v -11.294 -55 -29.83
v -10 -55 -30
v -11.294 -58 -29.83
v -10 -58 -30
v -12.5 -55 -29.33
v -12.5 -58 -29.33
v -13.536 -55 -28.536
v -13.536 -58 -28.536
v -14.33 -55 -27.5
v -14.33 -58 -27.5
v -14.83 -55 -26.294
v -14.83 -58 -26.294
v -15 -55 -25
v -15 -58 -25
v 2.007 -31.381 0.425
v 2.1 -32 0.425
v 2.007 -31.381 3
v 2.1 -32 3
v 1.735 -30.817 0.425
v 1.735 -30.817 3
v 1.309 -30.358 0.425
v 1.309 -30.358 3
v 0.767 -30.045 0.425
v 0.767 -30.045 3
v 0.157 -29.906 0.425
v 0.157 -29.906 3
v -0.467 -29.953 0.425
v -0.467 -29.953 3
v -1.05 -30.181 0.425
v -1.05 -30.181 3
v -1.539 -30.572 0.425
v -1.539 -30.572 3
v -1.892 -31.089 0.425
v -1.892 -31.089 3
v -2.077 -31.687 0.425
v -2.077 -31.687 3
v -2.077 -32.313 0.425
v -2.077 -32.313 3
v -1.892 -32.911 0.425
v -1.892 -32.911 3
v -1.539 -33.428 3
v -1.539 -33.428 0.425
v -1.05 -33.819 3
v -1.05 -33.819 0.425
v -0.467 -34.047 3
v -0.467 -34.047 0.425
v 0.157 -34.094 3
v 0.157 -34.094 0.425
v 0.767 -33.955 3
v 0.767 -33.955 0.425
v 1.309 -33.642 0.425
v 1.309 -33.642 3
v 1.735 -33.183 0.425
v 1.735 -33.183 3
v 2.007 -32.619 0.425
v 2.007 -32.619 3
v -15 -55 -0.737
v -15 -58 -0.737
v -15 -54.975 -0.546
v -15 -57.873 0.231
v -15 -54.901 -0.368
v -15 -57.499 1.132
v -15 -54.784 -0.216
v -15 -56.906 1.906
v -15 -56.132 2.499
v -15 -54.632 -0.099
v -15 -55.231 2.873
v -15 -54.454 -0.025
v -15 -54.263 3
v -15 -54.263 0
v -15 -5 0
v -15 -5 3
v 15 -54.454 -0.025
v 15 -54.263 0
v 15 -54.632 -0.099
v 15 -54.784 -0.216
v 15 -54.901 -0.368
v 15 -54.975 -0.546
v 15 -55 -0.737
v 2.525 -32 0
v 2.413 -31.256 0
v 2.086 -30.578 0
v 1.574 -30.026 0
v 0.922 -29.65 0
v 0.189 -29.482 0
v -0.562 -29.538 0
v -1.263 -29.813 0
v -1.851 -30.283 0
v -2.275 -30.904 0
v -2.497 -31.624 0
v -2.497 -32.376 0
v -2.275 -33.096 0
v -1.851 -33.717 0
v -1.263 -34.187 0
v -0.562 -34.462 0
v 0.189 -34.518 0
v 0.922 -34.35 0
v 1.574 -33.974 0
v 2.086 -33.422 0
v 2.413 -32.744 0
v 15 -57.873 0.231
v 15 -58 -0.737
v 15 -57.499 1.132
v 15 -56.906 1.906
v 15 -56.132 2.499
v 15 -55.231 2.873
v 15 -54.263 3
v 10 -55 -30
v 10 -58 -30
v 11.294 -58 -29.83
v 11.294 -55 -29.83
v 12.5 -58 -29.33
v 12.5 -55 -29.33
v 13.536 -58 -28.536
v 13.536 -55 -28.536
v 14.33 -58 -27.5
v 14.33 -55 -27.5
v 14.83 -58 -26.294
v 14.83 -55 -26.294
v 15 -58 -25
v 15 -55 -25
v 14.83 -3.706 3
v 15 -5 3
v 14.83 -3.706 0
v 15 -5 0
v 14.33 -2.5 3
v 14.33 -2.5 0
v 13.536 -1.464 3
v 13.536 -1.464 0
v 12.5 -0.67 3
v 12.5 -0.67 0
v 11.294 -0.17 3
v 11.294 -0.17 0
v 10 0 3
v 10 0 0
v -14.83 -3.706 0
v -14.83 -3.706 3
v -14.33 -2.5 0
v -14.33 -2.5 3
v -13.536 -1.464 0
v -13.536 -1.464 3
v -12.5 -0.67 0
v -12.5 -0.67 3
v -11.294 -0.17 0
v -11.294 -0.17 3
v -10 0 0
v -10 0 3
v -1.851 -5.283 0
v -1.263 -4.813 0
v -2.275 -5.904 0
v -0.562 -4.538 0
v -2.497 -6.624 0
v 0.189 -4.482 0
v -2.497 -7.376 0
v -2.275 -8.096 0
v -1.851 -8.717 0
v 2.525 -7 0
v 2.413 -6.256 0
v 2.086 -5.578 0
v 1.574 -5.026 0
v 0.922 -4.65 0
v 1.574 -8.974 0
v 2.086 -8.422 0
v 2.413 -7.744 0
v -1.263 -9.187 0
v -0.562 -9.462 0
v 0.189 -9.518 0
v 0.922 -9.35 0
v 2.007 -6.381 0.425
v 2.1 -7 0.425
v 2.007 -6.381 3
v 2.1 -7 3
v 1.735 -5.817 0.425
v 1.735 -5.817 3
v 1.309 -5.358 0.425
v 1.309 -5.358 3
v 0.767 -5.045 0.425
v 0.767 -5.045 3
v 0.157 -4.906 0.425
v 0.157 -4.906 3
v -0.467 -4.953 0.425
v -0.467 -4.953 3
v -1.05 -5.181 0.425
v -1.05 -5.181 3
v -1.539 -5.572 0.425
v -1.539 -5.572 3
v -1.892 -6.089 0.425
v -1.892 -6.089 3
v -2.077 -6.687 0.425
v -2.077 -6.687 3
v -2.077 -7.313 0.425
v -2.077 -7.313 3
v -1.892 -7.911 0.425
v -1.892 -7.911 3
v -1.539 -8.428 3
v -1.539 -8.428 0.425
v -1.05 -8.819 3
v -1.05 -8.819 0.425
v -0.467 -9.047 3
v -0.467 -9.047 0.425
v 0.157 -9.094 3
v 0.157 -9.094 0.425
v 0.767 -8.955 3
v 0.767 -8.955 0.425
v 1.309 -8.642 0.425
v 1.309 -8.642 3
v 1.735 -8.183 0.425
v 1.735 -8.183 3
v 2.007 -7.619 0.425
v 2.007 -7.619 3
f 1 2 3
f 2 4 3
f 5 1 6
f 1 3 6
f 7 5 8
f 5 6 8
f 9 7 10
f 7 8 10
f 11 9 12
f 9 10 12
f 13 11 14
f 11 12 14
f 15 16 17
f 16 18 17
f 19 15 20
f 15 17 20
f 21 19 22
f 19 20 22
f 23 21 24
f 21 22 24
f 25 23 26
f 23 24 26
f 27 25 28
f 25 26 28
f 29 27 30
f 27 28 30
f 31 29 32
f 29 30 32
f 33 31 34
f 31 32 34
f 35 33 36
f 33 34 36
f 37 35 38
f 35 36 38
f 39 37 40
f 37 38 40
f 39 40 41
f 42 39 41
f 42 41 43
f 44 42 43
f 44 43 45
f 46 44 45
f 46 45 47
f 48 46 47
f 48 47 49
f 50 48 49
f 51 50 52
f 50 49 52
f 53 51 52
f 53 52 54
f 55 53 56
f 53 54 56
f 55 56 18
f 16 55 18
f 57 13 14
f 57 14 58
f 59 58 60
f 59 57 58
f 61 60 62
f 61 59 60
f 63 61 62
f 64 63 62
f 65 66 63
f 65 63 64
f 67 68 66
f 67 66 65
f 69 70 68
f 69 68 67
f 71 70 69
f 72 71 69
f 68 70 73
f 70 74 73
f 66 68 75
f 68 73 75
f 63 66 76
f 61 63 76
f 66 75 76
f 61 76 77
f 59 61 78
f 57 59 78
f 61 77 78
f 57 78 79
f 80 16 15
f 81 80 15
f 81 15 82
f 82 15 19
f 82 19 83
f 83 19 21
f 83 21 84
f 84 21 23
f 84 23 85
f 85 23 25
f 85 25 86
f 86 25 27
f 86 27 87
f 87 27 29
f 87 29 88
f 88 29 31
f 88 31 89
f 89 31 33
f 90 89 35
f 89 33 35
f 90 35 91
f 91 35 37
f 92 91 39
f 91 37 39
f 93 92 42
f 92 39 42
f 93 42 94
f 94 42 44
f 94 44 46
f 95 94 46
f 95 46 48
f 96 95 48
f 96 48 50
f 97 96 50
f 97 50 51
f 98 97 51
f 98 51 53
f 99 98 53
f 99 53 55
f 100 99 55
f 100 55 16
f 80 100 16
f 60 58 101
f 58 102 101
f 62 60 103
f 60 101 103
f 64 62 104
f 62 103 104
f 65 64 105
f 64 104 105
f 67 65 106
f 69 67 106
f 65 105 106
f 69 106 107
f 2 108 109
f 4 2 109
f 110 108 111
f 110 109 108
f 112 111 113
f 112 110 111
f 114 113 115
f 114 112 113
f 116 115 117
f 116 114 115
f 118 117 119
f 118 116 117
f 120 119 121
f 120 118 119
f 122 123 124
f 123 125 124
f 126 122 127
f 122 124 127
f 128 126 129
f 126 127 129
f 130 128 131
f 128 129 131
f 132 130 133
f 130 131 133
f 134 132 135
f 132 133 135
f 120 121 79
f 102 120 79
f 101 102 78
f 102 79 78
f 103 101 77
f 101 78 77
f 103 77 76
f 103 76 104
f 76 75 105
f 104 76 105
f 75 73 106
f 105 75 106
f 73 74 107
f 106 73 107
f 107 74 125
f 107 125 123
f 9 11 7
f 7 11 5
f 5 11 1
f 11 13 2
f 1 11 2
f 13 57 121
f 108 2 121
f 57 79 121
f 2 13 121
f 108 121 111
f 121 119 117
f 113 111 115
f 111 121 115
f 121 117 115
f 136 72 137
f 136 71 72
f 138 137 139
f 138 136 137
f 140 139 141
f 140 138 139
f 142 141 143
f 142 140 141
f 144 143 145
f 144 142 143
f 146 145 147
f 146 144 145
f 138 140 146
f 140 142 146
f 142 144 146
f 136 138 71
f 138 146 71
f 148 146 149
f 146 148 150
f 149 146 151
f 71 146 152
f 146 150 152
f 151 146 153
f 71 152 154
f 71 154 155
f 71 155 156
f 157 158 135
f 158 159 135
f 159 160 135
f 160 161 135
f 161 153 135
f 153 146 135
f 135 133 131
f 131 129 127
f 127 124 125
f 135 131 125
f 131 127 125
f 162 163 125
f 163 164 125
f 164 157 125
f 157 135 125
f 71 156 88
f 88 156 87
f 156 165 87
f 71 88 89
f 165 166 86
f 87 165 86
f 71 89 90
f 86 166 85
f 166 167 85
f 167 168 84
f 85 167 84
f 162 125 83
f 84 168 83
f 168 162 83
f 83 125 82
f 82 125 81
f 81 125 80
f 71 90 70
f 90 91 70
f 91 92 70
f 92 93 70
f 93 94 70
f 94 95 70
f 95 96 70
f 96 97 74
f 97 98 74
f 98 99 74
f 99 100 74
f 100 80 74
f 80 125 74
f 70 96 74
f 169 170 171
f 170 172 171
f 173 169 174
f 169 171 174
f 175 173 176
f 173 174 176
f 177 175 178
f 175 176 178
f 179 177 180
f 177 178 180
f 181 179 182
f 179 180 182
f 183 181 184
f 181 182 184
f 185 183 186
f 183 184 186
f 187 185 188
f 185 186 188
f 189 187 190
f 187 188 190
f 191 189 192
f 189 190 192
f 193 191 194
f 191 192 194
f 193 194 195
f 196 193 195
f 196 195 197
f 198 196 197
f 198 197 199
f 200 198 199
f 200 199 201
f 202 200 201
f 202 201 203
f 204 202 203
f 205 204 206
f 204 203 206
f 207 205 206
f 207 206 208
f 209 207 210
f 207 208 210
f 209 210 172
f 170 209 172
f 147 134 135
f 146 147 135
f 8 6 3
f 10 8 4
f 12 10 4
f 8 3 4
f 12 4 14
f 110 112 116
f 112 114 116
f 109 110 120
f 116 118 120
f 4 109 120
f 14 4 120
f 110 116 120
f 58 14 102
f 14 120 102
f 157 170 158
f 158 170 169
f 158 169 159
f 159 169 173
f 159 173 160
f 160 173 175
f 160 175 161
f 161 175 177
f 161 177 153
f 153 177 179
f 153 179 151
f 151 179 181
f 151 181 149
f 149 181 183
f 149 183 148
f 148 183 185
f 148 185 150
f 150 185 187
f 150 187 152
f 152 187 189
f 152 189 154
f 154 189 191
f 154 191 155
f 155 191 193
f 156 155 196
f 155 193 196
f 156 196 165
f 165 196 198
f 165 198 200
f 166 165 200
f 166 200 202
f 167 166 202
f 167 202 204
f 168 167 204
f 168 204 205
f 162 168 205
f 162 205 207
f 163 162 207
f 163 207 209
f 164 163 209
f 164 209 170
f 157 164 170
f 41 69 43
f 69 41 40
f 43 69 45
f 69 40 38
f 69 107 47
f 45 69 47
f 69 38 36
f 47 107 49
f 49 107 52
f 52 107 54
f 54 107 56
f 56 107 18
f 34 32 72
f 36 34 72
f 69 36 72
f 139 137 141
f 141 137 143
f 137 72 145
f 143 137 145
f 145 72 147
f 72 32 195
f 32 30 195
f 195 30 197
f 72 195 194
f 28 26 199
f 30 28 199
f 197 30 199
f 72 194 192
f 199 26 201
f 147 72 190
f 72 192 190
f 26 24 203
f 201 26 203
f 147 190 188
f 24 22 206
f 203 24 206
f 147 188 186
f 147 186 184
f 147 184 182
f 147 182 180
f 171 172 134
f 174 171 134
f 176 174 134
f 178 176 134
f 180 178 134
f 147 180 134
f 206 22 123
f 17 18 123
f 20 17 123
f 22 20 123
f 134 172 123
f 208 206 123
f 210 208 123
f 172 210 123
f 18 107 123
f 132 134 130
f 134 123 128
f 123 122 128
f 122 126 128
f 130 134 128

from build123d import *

# Parameters (mm, degrees)
BASE_FLANGE1_DEPTH          = 15
M5_TAPPED_HOLE1_D           = 4.2
M5_TAPPED_HOLE1_DEPTH       = 14
M5_TAPPED_HOLE1_CSINK_D     = 5.05
M5_TAPPED_HOLE1_CSINK_ANGLE = 90
M5_TAPPED_HOLE1_TIP         = 1.2618073
FILLET1_R                   = 5


# Sheet-metal steps are written as plain solids
with BuildPart() as part:
    # Sketch1 → Base-Flange1 (new, symmetric)
    with BuildSketch(Plane(origin=(0, 0, 0), x_dir=(0, 0, -1), z_dir=(1, 0, 0))):
        with BuildLine():
            Line((0, 0), (0, -54.2634))
            ThreePointArc((0, -54.2634), (0.215745145, -54.784254855), (0.7366, -55))
            Line((0.7366, -55), (30, -55))
            Line((30, -55), (30, -58))
            Line((30, -58), (0.7366, -58))
            ThreePointArc((0.7366, -58), (-1.905575199, -56.905575199), (-3, -54.2634))
            Line((-3, -54.2634), (-3, 0))
            Line((-3, 0), (0, 0))
        make_face()
    extrude(amount=BASE_FLANGE1_DEPTH, both=True)

    # M5 Tapped Hole1
    with Locations(Plane(origin=(0, 0, 0), x_dir=(-1, 0, 0), z_dir=(0, 0, -1))):
        with Locations((0, -32), (0, -7)):
            CounterSinkHole(M5_TAPPED_HOLE1_D / 2, M5_TAPPED_HOLE1_CSINK_D / 2, depth=M5_TAPPED_HOLE1_DEPTH, counter_sink_angle=M5_TAPPED_HOLE1_CSINK_ANGLE)
            with Locations((0, 0, -(M5_TAPPED_HOLE1_DEPTH + M5_TAPPED_HOLE1_TIP / 2))):  # 118° drill point
                Cone(0, M5_TAPPED_HOLE1_D / 2, M5_TAPPED_HOLE1_TIP, mode=Mode.SUBTRACT)

    # Fillet1
    fillet1_edges = [part.edges().sort_by_distance(p)[0] for p in [
        (15, 0, 1.5),
        (-15, 0, 1.5),
        (15, -56.5, -30),
        (-15, -56.5, -30),
    ]]
    fillet(fillet1_edges, radius=FILLET1_R)


solid = part.part
